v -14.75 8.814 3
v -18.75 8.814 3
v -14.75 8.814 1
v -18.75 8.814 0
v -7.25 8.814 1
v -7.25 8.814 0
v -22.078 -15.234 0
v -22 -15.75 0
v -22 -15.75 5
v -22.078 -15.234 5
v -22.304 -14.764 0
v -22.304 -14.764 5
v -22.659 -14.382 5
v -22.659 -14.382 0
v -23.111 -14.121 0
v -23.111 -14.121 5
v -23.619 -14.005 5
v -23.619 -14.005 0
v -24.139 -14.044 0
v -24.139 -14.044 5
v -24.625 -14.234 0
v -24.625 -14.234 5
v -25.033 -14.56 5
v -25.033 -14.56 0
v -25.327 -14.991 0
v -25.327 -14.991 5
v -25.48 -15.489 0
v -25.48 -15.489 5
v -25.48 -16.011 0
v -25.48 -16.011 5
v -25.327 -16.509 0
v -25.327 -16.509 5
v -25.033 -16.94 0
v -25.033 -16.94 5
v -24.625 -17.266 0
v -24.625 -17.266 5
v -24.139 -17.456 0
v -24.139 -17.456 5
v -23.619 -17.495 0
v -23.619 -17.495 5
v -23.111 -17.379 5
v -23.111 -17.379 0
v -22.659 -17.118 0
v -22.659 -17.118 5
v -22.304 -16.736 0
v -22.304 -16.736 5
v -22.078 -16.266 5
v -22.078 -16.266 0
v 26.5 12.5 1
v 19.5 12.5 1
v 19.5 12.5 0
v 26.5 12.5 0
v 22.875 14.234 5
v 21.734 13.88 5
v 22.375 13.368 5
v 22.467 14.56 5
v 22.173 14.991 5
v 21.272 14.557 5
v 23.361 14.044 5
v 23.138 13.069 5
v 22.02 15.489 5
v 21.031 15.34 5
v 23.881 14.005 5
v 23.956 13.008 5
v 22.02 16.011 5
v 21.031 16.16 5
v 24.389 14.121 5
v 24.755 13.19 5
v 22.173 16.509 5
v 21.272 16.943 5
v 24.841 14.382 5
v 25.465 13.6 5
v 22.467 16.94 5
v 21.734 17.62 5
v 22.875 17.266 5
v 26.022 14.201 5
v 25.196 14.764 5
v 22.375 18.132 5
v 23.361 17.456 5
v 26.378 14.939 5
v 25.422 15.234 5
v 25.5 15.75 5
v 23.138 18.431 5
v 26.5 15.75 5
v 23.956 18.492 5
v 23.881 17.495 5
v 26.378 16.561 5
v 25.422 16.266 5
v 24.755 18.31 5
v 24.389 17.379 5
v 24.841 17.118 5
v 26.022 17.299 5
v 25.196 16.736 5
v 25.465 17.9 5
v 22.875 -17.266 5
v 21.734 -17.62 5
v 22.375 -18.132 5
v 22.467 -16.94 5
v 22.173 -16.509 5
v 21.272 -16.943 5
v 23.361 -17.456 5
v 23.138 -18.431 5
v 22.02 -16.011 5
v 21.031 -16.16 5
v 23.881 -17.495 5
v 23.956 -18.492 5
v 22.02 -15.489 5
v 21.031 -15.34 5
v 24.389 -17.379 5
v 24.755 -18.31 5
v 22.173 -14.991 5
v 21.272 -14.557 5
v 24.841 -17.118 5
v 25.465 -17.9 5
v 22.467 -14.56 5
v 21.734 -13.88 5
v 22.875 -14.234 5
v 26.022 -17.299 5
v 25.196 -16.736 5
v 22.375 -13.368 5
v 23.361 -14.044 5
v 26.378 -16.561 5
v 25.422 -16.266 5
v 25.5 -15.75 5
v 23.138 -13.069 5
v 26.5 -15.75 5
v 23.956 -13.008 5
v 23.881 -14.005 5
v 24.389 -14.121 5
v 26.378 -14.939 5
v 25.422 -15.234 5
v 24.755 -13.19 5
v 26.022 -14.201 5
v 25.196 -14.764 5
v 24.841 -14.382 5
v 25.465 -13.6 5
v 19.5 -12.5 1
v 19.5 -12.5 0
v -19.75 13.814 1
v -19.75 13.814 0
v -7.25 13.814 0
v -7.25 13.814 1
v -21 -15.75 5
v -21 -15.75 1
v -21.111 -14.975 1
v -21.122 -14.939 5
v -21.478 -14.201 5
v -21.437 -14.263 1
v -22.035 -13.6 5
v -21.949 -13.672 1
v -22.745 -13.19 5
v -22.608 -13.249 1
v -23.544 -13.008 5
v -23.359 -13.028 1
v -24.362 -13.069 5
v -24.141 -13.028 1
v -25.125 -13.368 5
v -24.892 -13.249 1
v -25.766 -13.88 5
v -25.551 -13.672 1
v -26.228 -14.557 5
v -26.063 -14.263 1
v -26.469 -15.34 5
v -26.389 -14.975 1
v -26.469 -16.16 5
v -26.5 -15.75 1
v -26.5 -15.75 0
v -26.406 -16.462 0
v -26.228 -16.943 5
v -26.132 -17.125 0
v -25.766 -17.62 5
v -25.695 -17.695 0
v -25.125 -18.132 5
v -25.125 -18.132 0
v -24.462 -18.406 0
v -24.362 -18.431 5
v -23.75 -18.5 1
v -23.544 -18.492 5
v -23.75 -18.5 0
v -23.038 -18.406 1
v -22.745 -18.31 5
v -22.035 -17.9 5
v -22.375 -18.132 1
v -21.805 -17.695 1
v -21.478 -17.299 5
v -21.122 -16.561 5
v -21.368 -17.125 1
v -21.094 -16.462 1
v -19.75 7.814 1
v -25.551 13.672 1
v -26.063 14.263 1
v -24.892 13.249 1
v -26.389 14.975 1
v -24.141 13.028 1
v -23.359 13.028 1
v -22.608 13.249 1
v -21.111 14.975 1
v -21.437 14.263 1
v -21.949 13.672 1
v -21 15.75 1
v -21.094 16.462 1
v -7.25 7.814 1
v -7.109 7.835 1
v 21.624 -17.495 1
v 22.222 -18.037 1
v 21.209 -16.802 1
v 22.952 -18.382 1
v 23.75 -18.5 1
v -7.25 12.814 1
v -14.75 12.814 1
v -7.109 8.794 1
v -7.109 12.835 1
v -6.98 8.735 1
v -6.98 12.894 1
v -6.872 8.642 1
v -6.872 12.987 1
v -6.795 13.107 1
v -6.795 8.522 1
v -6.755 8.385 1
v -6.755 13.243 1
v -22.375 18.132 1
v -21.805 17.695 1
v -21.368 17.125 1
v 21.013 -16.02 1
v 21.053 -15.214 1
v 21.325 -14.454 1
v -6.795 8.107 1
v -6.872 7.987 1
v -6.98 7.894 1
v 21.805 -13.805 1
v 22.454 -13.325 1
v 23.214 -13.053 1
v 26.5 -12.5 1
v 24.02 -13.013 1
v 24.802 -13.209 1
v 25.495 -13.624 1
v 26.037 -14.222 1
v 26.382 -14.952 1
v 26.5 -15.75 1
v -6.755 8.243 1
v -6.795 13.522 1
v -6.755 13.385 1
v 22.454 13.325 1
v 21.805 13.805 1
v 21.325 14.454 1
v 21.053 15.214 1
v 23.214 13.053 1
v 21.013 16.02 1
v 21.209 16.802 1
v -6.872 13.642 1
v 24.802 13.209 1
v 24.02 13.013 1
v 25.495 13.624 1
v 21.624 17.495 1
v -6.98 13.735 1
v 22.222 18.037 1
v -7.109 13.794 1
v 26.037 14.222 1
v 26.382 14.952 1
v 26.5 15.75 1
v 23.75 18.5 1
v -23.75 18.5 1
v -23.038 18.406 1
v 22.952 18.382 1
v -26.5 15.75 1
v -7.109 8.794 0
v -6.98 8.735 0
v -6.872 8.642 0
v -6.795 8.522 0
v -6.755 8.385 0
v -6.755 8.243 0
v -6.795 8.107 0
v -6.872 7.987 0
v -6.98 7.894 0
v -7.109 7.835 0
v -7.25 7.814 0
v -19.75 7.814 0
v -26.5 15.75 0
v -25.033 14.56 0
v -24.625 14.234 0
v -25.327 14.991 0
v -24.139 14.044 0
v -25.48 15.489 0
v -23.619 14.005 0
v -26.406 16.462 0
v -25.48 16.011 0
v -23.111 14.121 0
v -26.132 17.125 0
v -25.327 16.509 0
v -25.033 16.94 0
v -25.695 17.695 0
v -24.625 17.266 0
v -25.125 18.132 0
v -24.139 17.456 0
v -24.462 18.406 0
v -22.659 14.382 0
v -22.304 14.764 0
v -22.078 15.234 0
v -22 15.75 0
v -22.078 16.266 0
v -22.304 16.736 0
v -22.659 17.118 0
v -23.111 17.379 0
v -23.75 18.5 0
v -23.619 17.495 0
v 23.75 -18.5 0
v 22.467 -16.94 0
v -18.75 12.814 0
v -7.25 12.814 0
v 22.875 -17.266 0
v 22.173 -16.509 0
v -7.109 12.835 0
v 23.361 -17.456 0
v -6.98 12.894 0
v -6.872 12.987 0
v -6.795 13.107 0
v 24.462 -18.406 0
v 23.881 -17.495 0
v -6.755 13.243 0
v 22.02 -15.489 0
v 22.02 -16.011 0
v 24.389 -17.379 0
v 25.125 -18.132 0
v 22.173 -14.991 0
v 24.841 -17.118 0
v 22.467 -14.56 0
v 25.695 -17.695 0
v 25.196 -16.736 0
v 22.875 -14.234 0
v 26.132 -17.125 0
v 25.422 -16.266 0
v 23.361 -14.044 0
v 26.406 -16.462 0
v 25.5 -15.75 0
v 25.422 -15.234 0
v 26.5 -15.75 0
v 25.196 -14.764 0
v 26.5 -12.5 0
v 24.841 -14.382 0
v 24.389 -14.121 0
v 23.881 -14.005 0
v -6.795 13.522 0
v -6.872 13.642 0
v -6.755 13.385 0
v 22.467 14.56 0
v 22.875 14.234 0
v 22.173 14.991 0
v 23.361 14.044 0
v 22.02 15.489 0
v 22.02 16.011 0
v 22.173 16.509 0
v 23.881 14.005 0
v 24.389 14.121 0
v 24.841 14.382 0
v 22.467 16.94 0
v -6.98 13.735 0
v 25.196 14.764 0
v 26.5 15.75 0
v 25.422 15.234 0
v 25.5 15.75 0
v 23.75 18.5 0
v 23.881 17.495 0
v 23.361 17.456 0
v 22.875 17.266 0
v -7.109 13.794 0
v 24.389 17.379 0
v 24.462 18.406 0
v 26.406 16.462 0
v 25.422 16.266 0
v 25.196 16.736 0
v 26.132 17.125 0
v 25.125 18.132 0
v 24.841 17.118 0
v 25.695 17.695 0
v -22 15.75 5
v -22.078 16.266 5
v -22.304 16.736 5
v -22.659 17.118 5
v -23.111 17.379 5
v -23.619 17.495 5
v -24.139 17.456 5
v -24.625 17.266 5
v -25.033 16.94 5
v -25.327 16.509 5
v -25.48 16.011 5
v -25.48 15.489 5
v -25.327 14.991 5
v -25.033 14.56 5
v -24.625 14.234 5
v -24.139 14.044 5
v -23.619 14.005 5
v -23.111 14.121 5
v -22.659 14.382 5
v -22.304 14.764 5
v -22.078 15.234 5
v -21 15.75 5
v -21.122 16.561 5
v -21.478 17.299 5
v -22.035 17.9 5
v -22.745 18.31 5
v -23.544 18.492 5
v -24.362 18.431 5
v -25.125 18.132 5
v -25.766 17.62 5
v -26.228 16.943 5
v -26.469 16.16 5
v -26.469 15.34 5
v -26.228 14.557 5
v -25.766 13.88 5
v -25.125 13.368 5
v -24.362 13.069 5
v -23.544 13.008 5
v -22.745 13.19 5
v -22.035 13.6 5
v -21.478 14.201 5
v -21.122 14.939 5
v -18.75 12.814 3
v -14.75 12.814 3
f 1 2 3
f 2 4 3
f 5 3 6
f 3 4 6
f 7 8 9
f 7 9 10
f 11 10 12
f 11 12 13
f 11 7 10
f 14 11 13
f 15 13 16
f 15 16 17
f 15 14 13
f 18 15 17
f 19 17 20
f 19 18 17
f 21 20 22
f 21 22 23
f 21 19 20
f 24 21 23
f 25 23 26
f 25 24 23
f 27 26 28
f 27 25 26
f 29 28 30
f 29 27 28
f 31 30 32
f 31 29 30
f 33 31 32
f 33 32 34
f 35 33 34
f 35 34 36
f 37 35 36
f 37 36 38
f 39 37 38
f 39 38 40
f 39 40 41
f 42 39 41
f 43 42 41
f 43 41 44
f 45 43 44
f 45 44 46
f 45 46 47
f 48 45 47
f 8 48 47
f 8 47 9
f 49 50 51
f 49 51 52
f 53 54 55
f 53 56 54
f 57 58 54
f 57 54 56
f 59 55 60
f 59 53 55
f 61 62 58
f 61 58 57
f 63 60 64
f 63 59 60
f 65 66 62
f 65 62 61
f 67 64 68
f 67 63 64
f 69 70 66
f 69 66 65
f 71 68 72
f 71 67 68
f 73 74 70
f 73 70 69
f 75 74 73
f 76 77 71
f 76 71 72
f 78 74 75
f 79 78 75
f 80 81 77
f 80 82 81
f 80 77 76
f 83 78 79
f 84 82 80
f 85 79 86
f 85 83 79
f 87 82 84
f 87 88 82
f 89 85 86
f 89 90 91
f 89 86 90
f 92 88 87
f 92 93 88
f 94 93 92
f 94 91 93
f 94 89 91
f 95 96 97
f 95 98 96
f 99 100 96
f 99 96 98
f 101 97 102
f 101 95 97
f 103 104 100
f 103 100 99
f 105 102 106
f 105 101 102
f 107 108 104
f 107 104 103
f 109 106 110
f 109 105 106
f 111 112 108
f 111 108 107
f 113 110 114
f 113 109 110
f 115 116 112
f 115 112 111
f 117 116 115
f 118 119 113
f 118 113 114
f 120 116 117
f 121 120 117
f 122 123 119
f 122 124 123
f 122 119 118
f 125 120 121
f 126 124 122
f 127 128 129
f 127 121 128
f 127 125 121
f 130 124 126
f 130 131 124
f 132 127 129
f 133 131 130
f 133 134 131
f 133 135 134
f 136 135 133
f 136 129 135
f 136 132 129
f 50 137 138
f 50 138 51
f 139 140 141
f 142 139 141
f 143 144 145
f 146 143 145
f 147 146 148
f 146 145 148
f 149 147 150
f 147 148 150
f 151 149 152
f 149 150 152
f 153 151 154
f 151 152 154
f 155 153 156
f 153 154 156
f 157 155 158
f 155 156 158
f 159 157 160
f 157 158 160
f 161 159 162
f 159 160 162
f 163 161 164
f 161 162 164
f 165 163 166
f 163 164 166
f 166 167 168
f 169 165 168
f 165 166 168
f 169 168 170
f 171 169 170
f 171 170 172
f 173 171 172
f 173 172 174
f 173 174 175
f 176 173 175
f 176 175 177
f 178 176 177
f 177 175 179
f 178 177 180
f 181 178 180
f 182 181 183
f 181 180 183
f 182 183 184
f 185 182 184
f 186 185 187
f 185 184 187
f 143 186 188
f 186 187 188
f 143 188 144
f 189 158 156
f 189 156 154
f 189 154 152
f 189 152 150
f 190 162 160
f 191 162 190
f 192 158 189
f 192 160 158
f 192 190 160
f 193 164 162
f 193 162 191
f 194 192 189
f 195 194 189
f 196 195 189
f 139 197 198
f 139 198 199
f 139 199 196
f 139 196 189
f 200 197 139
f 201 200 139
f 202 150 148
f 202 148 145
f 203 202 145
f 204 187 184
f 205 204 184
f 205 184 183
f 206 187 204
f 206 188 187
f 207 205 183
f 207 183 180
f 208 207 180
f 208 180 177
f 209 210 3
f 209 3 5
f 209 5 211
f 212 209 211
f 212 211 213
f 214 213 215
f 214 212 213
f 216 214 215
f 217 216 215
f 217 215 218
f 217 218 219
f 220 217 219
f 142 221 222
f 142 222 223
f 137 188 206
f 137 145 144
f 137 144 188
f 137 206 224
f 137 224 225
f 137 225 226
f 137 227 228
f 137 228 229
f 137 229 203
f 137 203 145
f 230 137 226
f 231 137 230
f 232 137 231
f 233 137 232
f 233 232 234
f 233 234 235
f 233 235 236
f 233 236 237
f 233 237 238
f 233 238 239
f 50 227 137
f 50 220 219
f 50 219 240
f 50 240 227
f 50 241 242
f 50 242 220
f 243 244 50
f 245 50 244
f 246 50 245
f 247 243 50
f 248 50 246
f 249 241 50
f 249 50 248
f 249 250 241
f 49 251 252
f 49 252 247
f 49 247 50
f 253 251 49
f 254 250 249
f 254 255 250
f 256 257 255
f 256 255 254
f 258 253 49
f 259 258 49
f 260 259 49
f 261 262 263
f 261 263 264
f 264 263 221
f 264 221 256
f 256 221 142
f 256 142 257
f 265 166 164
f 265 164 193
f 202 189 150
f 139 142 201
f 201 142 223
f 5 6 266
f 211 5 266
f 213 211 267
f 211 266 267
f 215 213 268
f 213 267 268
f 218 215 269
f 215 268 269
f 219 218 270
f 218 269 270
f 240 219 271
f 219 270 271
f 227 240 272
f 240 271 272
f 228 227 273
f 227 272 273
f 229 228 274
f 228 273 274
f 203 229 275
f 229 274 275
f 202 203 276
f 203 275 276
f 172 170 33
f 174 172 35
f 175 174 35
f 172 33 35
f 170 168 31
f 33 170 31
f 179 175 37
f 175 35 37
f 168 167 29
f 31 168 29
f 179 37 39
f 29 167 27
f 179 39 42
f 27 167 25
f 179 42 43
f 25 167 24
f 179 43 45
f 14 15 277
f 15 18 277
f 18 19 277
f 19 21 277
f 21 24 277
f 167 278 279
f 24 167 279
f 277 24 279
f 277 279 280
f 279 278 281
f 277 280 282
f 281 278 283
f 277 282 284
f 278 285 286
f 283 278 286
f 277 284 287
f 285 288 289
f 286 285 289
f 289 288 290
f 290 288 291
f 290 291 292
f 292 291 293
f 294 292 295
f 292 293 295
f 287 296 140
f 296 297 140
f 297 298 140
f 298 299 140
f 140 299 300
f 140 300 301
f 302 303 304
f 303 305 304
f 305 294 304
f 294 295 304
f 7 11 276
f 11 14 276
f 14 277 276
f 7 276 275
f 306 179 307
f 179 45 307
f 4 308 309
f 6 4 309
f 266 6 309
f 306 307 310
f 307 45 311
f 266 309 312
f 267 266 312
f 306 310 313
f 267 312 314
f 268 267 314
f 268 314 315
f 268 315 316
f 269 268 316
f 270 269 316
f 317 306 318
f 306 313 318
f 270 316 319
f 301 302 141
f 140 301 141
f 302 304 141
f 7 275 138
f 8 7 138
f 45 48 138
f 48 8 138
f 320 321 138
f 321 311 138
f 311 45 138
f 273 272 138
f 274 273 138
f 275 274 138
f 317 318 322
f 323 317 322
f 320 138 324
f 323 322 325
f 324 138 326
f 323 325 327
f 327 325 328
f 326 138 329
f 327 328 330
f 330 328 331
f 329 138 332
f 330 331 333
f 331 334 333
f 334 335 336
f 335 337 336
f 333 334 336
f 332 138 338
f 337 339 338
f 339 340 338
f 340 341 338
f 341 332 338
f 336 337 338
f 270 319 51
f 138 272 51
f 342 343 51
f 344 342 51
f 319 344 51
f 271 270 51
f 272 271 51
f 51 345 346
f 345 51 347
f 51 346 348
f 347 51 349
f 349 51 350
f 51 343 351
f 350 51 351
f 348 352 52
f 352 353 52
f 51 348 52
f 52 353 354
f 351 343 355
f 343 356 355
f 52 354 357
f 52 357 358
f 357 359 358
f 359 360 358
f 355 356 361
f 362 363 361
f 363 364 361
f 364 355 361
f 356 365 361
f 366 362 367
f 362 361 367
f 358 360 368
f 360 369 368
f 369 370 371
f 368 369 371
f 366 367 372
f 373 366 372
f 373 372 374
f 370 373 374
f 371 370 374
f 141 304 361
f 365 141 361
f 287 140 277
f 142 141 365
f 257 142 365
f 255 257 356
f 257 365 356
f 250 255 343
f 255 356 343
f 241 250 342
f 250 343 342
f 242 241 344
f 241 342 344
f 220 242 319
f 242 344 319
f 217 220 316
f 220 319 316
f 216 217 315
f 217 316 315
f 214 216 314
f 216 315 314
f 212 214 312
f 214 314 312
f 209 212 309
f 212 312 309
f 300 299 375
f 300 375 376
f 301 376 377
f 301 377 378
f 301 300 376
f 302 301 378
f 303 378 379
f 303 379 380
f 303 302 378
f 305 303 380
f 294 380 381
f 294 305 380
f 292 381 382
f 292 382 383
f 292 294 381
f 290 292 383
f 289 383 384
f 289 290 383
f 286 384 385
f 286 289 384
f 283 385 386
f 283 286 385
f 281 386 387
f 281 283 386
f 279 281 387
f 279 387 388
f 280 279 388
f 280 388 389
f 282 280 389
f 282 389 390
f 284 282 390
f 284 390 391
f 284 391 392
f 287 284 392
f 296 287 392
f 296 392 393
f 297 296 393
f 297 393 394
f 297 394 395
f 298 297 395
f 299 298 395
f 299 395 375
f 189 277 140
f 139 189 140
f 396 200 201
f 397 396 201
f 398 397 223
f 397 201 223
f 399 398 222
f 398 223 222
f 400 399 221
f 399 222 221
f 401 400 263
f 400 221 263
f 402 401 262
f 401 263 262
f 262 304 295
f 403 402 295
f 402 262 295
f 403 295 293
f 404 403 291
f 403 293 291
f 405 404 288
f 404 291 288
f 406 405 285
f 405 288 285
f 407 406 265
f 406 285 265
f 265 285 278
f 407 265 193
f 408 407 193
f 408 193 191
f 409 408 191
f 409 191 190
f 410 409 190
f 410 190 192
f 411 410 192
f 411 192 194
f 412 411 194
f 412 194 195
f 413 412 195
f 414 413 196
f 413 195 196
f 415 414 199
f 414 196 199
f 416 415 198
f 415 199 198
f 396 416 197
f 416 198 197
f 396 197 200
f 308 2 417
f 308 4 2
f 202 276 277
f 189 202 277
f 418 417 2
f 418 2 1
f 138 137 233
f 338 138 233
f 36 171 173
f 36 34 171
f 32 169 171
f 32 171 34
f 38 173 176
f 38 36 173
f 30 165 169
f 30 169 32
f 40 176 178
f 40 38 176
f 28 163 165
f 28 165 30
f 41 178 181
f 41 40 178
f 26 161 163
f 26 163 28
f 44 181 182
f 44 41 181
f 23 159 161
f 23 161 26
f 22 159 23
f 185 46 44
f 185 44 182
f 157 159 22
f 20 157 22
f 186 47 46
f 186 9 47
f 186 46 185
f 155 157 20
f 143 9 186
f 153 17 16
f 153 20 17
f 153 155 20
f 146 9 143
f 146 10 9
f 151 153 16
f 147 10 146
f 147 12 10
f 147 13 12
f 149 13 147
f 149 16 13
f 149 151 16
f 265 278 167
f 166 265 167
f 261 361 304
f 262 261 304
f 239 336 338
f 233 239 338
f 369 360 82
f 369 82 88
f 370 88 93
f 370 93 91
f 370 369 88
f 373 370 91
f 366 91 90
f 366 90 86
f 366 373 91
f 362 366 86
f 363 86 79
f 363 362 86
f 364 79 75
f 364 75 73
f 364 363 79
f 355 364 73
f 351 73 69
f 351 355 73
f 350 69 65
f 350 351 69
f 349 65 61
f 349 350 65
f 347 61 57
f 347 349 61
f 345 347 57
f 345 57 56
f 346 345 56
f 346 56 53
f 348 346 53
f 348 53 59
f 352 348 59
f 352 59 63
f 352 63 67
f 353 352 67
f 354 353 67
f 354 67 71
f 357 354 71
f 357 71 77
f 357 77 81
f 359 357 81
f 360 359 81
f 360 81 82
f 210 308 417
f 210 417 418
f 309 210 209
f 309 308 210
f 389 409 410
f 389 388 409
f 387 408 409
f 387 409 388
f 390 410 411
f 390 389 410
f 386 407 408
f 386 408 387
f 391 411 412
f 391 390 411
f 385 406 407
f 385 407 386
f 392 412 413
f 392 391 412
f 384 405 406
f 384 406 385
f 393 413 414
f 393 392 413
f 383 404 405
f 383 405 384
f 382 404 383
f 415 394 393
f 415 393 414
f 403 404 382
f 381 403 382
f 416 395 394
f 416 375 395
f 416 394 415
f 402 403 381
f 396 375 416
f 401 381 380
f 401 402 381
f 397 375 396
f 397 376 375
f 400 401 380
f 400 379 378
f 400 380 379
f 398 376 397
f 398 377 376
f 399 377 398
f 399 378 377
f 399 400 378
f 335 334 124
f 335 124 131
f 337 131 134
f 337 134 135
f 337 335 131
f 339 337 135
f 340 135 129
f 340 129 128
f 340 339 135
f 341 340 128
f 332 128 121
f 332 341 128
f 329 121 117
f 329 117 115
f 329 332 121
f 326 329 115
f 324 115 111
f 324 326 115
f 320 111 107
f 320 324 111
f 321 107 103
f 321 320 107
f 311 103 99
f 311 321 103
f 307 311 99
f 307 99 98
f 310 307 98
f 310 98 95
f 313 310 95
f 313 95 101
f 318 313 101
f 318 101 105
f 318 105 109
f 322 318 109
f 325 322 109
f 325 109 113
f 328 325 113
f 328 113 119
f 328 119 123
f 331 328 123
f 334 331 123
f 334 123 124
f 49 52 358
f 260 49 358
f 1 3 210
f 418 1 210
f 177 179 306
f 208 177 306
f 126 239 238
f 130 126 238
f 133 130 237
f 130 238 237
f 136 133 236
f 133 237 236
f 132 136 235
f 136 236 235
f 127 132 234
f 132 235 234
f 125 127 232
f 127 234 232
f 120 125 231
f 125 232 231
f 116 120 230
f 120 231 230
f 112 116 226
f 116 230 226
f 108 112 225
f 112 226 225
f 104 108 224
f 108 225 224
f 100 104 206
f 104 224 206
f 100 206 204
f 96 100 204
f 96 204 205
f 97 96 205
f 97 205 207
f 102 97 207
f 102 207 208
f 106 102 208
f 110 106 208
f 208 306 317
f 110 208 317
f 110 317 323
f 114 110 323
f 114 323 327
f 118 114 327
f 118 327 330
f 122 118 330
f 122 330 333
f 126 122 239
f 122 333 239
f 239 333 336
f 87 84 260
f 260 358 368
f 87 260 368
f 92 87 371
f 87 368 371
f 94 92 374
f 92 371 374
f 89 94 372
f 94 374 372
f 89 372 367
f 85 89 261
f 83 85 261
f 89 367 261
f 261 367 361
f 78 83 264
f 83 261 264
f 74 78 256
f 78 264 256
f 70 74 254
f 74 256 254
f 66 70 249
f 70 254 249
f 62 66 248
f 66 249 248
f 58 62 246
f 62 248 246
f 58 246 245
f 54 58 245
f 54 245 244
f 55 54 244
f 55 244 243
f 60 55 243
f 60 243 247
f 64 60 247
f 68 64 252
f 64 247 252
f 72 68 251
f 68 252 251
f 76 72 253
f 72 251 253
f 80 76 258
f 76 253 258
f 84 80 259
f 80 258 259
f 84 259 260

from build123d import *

# Parameters (mm, degrees)
ESBO_O1_R                = 2.75
ESBO_O1_R_2              = 1.75
RESSALTO_EXTRUS_O1_DEPTH = 1
ESBO_O1_3_R              = 2.75
ESBO_O1_3_R_2            = 1.75
RESSALTO_EXTRUS_O2_DEPTH = 5
ESBO_O2_W                = 7
ESBO_O2_H                = 25
CORTE_EXTRUS_O1_DEPTH    = 6
CORTE_EXTRUS_O2_DEPTH    = 6
ESBO_O4_W                = 4
ESBO_O4_H                = 4
RESSALTO_EXTRUS_O3_DEPTH = 2


with BuildPart() as part:
    # Esboço1 → Ressalto-extrusão1 (new body)
    with BuildSketch(Plane.XY):
        with BuildLine():
            Line((23.75, 18.5), (-23.75, 18.5))
            ThreePointArc((-23.75, 18.5), (-21.805456352, 17.694543648), (-21, 15.75))
            ThreePointArc((-21, 15.75), (-23.75, 13), (-26.5, 15.75))
            Line((-26.5, 15.75), (-26.5, -15.75))
            ThreePointArc((-26.5, -15.75), (-23.75, -13), (-21, -15.75))
            ThreePointArc((-21, -15.75), (-21.805456352, -17.694543648), (-23.75, -18.5))
            Line((-23.75, -18.5), (23.75, -18.5))
            ThreePointArc((23.75, -18.5), (21.805456352, -13.805456352), (26.5, -15.75))
            Line((26.5, -15.75), (26.5, 15.75))
            ThreePointArc((26.5, 15.75), (21.805456352, 13.805456352), (23.75, 18.5))
        make_face()
        with Locations((23.75, 15.75)):
            Circle(ESBO_O1_R)
        with Locations((23.75, 15.75)):
            Circle(ESBO_O1_R_2, mode=Mode.SUBTRACT)
        with Locations((23.75, -15.75)):
            Circle(ESBO_O1_R)
        with Locations((23.75, -15.75)):
            Circle(ESBO_O1_R_2, mode=Mode.SUBTRACT)
        with Locations((-23.75, -15.75)):
            Circle(ESBO_O1_R)
        with Locations((-23.75, -15.75)):
            Circle(ESBO_O1_R_2, mode=Mode.SUBTRACT)
        with Locations((-23.75, 15.75)):
            Circle(ESBO_O1_R)
        with Locations((-23.75, 15.75)):
            Circle(ESBO_O1_R_2, mode=Mode.SUBTRACT)
    extrude(amount=RESSALTO_EXTRUS_O1_DEPTH)

    # Esboço1<3> → Ressalto-extrusão2 (add)
    with BuildSketch(Plane.XY):
        with Locations((-23.75, 15.75)):
            Circle(ESBO_O1_3_R)
        with Locations((-23.75, 15.75)):
            Circle(ESBO_O1_3_R_2, mode=Mode.SUBTRACT)
        with Locations((23.75, 15.75)):
            Circle(ESBO_O1_3_R)
        with Locations((23.75, 15.75)):
            Circle(ESBO_O1_3_R_2, mode=Mode.SUBTRACT)
        with Locations((23.75, -15.75)):
            Circle(ESBO_O1_3_R)
        with Locations((23.75, -15.75)):
            Circle(ESBO_O1_3_R_2, mode=Mode.SUBTRACT)
        with Locations((-23.75, -15.75)):
            Circle(ESBO_O1_3_R)
        with Locations((-23.75, -15.75)):
            Circle(ESBO_O1_3_R_2, mode=Mode.SUBTRACT)
    extrude(amount=RESSALTO_EXTRUS_O2_DEPTH)

    # Esboço2 → Corte-extrusão1 (cut)
    with BuildSketch(Plane.XY.offset(1)):
        with Locations((23, 0)):
            Rectangle(ESBO_O2_W, ESBO_O2_H)
    extrude(amount=-CORTE_EXTRUS_O1_DEPTH, mode=Mode.SUBTRACT)

    # Esboço3 → Corte-extrusão2 (cut)
    with BuildSketch(Plane(origin=(0, 0, 0), x_dir=(-1, 0, 0), z_dir=(0, 0, -1))):
        with BuildLine():
            Line((7.25, 12.814331343), (18.75, 12.814331343))
            Line((18.75, 12.814331343), (18.75, 8.814331343))
            Line((18.75, 8.814331343), (7.25, 8.814331343))
            ThreePointArc((7.25, 8.814331343), (6.75, 8.314331343), (7.25, 7.814331343))
            Line((7.25, 7.814331343), (19.75, 7.814331343))
            Line((19.75, 7.814331343), (19.75, 13.814331343))
            Line((19.75, 13.814331343), (7.25, 13.814331343))
            ThreePointArc((7.25, 13.814331343), (6.75, 13.314331343), (7.25, 12.814331343))
        make_face()
    extrude(amount=-CORTE_EXTRUS_O2_DEPTH, mode=Mode.SUBTRACT)

    # Esboço4 → Ressalto-extrusão3 (add)
    with BuildSketch(Plane.XY.offset(1)):
        with Locations((-16.75, 10.814331343)):
            Rectangle(ESBO_O4_W, ESBO_O4_H)
    extrude(amount=RESSALTO_EXTRUS_O3_DEPTH)


solid = part.part
